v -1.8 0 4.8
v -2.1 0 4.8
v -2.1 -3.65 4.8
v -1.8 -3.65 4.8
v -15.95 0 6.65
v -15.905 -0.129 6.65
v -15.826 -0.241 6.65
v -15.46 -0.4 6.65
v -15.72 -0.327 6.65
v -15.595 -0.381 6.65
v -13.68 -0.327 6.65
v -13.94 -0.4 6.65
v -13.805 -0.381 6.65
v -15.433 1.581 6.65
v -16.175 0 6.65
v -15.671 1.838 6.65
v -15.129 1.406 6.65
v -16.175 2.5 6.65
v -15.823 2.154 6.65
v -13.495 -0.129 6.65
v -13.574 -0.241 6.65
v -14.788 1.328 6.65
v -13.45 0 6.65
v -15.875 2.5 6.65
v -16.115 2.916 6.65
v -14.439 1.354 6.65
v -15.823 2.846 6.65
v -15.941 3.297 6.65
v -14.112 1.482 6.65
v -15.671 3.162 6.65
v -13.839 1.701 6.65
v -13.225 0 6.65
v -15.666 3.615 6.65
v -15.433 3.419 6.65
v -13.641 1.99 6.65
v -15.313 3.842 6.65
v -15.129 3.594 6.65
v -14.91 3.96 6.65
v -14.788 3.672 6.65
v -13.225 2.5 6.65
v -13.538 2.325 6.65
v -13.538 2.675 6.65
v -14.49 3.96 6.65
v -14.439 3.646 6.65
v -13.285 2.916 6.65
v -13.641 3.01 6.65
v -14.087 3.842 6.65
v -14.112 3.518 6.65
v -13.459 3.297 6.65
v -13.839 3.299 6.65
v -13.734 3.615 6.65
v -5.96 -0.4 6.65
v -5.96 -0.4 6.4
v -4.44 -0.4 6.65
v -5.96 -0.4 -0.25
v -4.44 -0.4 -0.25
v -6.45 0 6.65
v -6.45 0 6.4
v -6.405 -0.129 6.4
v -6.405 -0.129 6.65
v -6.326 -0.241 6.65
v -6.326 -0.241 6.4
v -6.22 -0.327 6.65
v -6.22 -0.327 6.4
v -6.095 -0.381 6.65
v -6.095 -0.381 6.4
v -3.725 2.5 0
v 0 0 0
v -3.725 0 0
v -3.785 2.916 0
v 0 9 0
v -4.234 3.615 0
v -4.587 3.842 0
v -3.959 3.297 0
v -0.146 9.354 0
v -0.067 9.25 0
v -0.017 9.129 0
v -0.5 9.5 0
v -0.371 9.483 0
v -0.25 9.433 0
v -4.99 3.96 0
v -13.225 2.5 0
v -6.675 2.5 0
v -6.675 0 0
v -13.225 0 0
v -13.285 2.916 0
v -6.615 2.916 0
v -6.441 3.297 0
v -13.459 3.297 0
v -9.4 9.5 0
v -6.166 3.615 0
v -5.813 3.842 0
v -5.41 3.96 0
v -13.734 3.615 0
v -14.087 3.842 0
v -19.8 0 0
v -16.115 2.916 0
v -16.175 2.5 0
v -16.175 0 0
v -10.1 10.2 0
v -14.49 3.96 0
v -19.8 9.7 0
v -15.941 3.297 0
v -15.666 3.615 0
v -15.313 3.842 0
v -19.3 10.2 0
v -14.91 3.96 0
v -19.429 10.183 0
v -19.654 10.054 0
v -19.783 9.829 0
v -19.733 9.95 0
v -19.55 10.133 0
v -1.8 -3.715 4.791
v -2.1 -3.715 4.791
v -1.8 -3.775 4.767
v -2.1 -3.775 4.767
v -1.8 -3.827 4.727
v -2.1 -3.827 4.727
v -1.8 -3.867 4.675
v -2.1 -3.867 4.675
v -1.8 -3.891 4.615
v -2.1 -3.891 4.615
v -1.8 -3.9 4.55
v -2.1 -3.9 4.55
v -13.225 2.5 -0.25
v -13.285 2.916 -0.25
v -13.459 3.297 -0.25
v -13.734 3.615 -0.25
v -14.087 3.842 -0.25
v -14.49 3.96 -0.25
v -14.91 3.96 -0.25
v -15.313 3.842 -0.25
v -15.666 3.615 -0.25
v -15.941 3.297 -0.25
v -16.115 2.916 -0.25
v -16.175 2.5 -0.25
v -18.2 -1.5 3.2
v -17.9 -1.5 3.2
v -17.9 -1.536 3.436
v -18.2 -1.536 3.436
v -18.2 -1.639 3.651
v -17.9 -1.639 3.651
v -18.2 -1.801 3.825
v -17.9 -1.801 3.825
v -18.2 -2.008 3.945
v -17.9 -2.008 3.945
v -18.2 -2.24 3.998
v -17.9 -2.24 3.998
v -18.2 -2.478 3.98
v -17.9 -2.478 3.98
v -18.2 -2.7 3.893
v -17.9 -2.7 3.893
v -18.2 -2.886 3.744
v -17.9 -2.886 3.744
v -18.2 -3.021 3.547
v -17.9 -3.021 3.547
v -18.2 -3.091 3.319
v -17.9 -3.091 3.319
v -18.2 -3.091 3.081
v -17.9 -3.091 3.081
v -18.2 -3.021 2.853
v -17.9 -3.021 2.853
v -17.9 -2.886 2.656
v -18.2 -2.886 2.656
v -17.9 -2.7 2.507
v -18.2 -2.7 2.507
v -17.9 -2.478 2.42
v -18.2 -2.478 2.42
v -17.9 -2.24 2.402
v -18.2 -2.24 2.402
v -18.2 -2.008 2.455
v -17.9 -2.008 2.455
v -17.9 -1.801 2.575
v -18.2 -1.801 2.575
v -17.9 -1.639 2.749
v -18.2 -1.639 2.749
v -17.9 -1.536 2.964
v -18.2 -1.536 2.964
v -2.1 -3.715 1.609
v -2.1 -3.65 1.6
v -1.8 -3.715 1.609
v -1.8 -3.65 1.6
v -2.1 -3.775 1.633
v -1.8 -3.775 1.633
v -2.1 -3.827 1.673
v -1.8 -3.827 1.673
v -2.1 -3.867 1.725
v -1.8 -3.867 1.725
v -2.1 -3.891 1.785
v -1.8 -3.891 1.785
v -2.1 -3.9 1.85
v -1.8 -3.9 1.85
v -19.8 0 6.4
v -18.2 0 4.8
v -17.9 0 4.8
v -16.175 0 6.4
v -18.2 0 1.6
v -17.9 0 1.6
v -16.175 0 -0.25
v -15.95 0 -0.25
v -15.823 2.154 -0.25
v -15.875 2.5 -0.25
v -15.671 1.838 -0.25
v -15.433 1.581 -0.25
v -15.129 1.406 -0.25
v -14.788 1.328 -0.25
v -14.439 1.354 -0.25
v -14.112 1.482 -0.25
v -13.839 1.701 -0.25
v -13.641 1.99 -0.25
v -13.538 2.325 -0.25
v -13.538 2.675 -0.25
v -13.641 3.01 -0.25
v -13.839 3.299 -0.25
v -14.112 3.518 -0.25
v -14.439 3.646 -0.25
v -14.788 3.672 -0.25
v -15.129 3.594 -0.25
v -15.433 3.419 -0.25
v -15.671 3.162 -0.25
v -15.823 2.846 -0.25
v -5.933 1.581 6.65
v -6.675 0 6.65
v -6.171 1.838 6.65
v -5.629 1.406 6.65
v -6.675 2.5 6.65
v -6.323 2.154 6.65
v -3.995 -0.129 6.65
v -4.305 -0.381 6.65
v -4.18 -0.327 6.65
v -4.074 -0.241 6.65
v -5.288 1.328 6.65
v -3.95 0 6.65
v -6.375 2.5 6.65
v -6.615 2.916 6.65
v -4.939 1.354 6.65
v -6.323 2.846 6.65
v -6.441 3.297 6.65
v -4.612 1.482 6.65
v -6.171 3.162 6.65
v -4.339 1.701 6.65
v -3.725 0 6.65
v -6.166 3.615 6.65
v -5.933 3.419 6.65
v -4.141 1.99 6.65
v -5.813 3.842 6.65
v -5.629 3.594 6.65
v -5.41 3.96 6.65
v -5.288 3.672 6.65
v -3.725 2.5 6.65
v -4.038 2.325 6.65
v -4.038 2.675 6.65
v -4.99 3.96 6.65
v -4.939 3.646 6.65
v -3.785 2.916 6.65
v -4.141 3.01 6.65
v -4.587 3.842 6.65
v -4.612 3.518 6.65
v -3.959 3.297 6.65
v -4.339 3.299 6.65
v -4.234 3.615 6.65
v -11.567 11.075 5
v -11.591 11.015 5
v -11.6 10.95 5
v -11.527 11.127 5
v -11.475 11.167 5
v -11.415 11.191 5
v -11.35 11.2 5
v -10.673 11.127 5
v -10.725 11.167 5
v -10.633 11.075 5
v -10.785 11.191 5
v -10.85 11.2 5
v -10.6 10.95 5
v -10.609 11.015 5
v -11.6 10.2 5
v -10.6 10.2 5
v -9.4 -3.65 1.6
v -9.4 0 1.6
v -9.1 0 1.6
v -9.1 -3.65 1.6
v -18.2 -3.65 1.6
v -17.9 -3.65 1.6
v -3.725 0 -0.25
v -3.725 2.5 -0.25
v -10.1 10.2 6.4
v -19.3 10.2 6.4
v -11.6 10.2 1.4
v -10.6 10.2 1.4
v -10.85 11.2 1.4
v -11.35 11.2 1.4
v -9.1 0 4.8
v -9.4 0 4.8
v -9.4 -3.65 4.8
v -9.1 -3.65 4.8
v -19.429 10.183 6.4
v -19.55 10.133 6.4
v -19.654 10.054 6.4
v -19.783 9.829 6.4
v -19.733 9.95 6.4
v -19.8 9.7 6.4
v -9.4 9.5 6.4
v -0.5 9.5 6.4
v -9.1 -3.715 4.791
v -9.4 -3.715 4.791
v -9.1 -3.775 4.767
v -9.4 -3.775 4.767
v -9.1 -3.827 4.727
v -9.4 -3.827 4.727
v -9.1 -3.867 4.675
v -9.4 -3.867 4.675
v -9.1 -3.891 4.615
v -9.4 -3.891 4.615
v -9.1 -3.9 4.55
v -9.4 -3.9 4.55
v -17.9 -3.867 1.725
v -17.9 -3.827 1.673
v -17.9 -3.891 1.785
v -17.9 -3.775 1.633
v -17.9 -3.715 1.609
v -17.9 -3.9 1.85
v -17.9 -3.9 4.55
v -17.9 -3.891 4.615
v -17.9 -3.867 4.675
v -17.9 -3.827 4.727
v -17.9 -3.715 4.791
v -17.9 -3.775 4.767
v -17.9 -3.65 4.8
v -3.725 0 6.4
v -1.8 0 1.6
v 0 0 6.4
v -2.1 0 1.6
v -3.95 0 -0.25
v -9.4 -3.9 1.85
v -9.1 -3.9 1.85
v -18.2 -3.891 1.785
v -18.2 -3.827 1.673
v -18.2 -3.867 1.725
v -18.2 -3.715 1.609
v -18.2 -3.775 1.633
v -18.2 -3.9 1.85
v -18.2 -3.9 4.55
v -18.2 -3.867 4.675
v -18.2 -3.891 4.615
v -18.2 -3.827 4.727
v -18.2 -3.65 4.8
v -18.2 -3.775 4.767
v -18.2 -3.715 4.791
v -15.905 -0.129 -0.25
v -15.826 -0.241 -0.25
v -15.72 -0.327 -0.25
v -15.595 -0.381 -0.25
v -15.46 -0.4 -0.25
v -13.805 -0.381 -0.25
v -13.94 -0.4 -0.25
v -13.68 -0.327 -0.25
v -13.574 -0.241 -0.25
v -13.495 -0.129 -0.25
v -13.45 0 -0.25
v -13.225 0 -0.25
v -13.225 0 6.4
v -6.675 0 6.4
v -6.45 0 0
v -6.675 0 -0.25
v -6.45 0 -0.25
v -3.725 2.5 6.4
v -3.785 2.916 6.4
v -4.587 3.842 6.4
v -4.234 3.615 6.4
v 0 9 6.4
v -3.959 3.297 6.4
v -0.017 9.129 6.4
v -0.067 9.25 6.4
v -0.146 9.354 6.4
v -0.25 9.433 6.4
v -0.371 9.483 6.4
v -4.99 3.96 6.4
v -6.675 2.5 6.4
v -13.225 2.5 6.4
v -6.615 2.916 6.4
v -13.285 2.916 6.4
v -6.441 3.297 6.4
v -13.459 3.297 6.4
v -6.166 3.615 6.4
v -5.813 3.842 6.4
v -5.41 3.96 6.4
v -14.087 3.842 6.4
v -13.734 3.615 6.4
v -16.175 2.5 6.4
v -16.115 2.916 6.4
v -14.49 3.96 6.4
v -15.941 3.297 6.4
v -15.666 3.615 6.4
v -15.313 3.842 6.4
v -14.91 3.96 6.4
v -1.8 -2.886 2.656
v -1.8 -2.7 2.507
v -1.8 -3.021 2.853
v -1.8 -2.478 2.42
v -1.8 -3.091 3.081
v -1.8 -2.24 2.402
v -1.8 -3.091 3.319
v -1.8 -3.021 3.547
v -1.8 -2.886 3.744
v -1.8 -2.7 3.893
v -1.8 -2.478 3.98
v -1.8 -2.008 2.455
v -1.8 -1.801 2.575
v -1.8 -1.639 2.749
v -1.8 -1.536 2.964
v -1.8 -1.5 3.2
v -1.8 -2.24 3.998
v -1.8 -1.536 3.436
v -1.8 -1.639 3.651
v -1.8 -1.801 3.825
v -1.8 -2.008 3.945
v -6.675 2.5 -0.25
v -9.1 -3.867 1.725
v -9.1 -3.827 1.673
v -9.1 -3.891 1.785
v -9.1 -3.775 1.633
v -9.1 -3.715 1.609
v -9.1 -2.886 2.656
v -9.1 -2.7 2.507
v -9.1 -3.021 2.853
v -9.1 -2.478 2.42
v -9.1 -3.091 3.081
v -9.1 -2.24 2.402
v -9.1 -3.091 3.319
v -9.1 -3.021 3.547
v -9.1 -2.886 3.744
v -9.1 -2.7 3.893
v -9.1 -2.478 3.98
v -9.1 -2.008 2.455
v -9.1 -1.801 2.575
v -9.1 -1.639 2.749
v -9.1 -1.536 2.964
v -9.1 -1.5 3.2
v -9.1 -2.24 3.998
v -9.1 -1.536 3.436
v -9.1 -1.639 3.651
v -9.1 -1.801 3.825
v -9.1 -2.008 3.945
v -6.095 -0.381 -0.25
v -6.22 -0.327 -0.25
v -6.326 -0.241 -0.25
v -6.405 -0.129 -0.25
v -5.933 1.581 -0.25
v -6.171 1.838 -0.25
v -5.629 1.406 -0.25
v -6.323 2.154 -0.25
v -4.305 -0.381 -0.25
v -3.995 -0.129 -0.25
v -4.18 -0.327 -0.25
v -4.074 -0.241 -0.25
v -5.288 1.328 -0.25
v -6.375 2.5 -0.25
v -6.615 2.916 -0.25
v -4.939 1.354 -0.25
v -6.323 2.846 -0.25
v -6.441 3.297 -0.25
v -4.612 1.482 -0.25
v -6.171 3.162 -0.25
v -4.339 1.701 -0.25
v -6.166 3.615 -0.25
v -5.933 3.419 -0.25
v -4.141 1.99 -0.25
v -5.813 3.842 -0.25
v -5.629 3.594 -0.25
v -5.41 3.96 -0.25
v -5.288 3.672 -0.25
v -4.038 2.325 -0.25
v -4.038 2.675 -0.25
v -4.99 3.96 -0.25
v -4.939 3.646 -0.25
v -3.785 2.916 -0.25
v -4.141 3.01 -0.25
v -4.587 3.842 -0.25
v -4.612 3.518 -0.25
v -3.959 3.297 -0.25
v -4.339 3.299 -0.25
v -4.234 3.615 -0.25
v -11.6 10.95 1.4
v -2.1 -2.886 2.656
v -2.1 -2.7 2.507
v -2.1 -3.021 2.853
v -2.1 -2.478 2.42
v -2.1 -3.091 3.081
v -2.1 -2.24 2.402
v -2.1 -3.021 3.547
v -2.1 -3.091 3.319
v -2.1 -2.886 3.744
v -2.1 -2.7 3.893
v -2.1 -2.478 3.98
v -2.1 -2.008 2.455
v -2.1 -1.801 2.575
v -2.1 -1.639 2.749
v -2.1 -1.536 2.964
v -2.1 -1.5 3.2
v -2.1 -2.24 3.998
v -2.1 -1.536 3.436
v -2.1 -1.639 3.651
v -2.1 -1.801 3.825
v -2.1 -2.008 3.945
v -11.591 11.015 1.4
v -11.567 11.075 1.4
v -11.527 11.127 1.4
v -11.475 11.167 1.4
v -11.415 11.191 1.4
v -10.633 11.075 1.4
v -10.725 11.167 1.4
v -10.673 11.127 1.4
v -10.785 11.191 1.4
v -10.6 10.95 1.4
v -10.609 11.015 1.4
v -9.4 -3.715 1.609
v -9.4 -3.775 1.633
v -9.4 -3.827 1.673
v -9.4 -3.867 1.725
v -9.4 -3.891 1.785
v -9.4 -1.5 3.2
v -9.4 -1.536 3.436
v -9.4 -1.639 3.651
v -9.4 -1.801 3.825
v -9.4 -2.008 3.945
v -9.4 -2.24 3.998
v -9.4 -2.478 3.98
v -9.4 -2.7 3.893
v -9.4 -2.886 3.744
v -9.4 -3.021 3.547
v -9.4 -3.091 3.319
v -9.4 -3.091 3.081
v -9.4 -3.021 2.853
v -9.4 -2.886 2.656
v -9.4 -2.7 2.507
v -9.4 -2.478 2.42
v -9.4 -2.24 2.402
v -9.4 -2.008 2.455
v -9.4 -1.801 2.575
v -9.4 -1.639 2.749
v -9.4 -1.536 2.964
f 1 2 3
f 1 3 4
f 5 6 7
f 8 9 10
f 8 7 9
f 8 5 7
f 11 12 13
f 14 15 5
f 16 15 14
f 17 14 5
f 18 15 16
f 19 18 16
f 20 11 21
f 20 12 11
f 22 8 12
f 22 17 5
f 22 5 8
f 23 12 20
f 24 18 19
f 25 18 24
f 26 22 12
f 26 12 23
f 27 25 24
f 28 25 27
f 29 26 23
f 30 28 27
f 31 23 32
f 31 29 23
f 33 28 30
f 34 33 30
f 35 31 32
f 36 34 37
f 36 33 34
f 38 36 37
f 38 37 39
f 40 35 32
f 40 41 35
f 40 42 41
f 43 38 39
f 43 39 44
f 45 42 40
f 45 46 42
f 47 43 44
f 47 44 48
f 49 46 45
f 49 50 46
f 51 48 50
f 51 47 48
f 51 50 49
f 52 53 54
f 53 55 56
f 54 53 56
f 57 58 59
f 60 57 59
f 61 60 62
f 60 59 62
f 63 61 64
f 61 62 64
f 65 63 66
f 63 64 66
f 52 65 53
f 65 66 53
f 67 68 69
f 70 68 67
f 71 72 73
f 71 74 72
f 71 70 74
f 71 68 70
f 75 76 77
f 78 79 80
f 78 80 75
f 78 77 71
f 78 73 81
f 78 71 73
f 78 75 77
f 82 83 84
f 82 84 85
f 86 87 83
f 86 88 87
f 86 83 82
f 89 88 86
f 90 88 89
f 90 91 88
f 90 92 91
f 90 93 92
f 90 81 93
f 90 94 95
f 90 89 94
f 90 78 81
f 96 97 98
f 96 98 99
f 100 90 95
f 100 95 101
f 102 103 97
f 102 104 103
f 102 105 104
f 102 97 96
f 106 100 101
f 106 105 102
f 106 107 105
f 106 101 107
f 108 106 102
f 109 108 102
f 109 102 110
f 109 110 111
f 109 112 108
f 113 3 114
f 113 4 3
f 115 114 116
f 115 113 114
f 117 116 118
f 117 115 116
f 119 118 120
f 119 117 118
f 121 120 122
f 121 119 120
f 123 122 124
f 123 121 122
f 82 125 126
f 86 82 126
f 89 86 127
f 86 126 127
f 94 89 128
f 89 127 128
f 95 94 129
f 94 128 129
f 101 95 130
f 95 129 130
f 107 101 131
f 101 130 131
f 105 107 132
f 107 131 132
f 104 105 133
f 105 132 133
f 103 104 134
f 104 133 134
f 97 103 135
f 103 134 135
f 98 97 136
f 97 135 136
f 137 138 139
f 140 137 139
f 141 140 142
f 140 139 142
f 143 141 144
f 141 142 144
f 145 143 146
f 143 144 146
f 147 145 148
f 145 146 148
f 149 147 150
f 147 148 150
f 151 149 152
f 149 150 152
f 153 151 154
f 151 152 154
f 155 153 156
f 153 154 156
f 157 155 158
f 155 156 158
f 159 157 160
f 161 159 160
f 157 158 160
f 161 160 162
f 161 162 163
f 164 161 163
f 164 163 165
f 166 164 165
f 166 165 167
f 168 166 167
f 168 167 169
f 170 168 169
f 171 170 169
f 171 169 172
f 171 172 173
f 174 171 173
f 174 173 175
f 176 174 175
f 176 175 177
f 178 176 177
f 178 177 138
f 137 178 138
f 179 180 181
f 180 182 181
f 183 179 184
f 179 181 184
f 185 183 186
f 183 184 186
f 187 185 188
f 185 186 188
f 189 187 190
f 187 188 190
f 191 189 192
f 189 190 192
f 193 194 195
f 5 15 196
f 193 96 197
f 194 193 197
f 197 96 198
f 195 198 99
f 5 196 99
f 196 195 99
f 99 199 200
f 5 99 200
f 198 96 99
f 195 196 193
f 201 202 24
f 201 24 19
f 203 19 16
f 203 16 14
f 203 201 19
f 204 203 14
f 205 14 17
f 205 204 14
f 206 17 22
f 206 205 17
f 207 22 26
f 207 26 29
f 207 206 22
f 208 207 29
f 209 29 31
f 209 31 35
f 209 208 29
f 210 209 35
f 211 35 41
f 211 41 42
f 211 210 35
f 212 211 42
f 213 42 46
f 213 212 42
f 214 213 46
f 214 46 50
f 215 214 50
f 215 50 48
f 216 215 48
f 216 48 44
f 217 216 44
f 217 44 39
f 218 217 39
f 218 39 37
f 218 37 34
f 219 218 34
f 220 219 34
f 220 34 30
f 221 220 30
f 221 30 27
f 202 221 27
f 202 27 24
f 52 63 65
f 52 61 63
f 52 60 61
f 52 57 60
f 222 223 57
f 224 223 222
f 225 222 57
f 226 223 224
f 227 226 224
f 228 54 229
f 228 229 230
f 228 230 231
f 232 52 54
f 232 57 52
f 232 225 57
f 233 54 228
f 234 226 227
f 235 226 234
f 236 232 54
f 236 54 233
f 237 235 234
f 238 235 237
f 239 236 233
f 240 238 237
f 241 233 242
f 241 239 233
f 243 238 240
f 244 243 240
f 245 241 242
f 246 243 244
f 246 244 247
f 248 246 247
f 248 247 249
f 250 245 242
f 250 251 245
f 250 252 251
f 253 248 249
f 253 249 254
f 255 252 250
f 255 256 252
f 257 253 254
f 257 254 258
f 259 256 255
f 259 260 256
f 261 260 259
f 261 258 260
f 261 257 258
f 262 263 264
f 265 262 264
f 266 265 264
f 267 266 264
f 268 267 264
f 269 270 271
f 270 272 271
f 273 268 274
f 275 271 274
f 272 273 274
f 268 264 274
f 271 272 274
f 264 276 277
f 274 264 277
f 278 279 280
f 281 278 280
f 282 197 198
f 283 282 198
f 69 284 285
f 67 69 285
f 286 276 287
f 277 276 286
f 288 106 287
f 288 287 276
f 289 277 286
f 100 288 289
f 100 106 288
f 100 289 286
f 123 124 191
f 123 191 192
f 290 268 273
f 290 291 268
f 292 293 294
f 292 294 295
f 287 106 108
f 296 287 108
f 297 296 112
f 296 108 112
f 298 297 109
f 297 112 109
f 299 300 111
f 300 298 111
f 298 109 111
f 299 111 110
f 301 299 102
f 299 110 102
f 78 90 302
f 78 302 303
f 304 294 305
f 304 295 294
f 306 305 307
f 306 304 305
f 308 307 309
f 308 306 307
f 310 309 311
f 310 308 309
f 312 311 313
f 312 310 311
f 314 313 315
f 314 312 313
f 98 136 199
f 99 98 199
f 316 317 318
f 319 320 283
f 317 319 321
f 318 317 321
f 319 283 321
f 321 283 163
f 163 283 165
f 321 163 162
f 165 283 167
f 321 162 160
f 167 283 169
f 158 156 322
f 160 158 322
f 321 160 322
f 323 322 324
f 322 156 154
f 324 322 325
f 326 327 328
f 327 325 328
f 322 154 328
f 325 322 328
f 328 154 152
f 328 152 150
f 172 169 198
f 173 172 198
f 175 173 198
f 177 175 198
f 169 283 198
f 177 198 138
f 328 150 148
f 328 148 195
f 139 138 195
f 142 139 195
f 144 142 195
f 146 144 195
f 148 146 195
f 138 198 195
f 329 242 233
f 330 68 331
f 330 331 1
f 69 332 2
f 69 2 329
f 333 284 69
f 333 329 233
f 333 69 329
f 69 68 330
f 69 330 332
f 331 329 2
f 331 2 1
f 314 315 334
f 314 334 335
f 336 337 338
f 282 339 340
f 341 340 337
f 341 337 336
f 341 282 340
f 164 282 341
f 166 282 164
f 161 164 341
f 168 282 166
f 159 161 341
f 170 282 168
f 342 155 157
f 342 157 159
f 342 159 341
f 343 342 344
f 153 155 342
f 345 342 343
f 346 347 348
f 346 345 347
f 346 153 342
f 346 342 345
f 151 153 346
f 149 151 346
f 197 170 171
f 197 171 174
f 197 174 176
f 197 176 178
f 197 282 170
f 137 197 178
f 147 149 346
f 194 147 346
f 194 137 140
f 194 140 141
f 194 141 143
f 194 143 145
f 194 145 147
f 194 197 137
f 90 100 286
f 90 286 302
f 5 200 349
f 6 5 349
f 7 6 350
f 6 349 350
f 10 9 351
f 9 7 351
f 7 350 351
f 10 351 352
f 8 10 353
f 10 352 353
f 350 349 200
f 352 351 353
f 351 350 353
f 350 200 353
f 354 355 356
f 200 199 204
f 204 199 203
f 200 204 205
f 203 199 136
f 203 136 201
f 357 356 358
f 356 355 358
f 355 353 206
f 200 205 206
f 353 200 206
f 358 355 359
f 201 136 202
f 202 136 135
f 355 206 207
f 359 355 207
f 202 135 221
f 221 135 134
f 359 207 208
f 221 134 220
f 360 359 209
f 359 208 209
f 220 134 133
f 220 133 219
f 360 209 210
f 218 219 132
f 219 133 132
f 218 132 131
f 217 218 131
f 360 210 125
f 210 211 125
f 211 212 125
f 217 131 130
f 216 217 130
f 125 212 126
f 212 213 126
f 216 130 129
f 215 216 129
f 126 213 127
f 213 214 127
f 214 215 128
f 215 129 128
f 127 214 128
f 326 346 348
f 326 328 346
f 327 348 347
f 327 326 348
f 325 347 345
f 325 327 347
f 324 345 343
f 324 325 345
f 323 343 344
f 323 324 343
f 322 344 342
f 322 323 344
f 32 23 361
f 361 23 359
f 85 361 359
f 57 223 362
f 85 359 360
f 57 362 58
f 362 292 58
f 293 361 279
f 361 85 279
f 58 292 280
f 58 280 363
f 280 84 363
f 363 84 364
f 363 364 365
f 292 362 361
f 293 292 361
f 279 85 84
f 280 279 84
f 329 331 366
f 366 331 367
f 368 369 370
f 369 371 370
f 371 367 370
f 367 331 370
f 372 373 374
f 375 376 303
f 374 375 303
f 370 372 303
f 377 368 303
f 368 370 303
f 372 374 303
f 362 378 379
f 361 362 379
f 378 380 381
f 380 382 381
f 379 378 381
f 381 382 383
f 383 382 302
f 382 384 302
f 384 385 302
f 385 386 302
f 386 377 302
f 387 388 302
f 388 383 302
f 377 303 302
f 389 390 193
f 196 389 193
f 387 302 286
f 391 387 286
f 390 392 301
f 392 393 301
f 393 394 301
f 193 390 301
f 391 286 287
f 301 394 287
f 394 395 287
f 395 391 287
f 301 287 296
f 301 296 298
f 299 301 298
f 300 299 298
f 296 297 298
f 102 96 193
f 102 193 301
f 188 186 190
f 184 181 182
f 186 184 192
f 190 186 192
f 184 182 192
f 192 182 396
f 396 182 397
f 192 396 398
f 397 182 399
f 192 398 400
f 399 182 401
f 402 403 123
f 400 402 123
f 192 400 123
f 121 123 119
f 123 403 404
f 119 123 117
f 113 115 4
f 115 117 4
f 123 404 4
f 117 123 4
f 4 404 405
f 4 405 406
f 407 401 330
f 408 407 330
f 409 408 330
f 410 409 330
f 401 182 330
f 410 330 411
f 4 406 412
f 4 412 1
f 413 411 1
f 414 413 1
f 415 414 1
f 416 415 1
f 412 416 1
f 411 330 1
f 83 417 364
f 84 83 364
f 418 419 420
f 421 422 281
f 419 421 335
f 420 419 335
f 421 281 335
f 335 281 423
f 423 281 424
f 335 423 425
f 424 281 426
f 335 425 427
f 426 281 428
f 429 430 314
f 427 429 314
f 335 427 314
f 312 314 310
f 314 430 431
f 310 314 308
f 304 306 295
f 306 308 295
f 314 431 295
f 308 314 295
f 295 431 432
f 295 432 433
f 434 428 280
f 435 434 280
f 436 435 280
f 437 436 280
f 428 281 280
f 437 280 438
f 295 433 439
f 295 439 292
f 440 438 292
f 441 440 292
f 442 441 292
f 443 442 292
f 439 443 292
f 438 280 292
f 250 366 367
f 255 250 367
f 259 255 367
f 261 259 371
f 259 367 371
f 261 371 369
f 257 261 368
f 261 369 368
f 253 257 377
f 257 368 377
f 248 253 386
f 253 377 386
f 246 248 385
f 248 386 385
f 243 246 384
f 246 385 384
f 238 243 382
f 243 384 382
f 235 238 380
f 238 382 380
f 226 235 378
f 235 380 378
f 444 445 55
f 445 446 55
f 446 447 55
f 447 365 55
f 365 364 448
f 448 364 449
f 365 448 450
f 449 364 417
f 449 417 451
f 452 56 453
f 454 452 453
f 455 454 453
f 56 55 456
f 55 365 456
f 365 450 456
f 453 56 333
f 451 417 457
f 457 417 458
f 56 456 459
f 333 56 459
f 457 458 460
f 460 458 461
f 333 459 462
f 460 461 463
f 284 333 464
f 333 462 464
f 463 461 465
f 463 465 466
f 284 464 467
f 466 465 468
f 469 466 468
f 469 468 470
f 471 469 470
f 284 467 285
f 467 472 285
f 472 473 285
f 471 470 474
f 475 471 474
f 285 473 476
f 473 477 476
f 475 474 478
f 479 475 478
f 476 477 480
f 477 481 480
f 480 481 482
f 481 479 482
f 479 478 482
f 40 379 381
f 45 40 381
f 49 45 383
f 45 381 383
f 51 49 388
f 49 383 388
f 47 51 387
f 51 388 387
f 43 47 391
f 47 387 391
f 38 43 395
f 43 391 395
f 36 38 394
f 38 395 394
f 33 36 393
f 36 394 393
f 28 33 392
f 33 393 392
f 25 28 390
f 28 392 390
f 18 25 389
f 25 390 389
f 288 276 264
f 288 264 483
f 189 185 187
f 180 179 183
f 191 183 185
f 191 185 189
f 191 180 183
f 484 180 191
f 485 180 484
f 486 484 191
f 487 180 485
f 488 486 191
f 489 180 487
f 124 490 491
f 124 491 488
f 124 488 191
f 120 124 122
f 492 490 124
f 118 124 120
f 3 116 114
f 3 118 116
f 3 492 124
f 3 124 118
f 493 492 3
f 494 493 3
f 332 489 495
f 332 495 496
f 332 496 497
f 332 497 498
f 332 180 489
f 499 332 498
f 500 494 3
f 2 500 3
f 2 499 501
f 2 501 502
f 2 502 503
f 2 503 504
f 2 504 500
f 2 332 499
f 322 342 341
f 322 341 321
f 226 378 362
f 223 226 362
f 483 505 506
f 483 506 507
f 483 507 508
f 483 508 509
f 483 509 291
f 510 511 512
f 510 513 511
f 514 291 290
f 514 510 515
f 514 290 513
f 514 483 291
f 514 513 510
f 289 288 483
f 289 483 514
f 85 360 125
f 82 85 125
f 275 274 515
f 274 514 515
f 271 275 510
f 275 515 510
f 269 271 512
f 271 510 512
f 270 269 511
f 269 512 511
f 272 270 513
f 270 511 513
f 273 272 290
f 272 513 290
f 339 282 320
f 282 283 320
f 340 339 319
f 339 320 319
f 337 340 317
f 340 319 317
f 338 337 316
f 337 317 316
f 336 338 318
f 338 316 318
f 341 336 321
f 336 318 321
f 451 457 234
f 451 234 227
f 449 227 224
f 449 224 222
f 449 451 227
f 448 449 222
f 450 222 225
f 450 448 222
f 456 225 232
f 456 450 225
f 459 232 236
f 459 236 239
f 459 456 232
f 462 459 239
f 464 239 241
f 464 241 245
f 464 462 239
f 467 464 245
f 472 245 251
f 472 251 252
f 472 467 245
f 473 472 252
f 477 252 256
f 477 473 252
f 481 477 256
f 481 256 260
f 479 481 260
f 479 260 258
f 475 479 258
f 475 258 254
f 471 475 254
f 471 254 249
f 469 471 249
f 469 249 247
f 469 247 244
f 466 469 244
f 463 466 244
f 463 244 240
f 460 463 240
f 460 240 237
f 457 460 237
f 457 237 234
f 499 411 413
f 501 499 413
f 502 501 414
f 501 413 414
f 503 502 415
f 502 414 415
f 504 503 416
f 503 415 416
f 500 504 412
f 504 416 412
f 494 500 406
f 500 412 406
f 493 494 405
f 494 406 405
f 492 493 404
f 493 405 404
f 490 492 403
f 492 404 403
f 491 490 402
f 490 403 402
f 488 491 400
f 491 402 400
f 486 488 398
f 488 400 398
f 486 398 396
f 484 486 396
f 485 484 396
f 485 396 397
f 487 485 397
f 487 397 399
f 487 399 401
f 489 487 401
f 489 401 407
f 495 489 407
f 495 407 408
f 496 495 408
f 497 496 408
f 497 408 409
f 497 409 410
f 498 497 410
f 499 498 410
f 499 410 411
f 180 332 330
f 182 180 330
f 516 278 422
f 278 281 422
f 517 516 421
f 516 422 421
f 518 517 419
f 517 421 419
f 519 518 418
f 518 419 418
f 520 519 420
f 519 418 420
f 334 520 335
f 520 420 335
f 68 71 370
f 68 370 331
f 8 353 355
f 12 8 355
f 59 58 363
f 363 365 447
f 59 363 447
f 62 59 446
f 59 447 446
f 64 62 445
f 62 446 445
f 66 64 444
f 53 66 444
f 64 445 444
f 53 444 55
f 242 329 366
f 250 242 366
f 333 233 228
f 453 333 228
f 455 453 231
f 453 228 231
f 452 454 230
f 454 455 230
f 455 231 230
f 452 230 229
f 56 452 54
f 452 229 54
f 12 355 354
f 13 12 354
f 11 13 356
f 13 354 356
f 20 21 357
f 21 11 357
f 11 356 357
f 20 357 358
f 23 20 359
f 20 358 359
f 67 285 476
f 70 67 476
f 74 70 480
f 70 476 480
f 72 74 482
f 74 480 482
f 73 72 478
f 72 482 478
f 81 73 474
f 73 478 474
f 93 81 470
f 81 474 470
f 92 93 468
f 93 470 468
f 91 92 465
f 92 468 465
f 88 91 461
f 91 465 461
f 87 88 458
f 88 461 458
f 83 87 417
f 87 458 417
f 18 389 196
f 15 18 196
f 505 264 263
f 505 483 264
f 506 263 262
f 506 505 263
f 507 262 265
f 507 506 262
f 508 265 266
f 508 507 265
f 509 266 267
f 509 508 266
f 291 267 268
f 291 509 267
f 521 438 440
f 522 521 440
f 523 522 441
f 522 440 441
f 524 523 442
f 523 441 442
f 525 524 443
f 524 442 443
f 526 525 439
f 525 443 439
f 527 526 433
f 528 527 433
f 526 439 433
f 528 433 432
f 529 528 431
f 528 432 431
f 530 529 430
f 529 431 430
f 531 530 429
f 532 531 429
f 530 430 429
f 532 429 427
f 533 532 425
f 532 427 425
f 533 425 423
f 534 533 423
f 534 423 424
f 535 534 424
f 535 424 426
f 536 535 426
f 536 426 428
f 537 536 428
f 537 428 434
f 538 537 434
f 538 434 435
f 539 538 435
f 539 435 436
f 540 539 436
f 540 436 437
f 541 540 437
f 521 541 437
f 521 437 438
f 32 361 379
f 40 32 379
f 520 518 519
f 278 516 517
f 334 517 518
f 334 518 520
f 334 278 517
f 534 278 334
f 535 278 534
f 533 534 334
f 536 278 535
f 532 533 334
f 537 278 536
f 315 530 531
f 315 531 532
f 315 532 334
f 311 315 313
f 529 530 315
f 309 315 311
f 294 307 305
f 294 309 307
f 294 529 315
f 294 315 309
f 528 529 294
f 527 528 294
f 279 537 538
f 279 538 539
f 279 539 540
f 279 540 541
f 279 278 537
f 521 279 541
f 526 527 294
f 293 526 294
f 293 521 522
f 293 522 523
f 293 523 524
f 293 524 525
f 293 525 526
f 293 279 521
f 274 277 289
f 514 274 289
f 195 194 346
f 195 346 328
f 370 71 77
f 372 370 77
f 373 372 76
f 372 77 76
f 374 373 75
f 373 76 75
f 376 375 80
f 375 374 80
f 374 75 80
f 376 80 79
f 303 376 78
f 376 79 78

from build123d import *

# Parameters (mm, degrees)
SKETCH1_R                = 1.175
BOSS_EXTRUDE1_DEPTH      = 6.4
SKETCH2_W                = 1
SKETCH2_H                = 3.6
BOSS_EXTRUDE2_DEPTH      = 1
SKETCH3_W                = 0.3
SKETCH3_H                = 3.2
BOSS_EXTRUDE3_DEPTH      = 3.9
SKETCH4_R                = 0.8
CUT_EXTRUDE1_DEPTH       = 23.144976857
BOSS_EXTRUDE4_DEPTH      = 0.25
BOSS_EXTRUDE4_DEPTH_BACK = 6.65
SKETCH5_R                = 1.175
FILLET1_R                = 0.5
FILLET2_R                = 0.25
FILLET3_R                = 0.25


with BuildPart() as part:
    # Sketch1 → Boss-Extrude1 (new body)
    with BuildSketch(Plane.XY):
        Polygon((0, 0), (-3.95, 0), (-3.95, -0.4), (-6.45, -0.4), (-6.45, 0), (-13.45, 0), (-13.45, -0.4), (-15.95, -0.4), (-15.95, 0), (-19.8, 0), (-19.8, 10.2), (-10.1, 10.2), (-9.4, 9.5), (0, 9.5), align=None)
        with Locations((-14.7, 2.5)):
            Circle(SKETCH1_R, mode=Mode.SUBTRACT)
        with Locations((-5.2, 2.5)):
            Circle(SKETCH1_R, mode=Mode.SUBTRACT)
    extrude(amount=BOSS_EXTRUDE1_DEPTH)

    # Sketch2 → Boss-Extrude2 (add)
    with BuildSketch(Plane(origin=(0, 10.2, 0), x_dir=(1, 0, 0), z_dir=(0, 1, 0))):
        with Locations((-11.1, -3.2)):
            Rectangle(SKETCH2_W, SKETCH2_H)
    extrude(amount=BOSS_EXTRUDE2_DEPTH)

    # Sketch3 → Boss-Extrude3 (add)
    with BuildSketch(Plane.XZ):
        with Locations((-18.05, 3.2)):
            Rectangle(SKETCH3_W, SKETCH3_H)
        with Locations((-9.25, 3.2)):
            Rectangle(SKETCH3_W, SKETCH3_H)
        with Locations((-1.95, 3.2)):
            Rectangle(SKETCH3_W, SKETCH3_H)
    extrude(amount=BOSS_EXTRUDE3_DEPTH)

    # Sketch4 → Cut-Extrude1 (cut, through all)
    with BuildSketch(Plane(origin=(-1.8, 0, 0), x_dir=(0, 0, -1), z_dir=(1, 0, 0))):
        with Locations(Location((-3.2, -2.3, 0), (0, 0, 90))):
            Circle(SKETCH4_R)
    extrude(amount=-CUT_EXTRUDE1_DEPTH, mode=Mode.SUBTRACT)

    # Sketch5 → Boss-Extrude4 (add, two sides: drawn at the far end of the back side and taken through both)
    # profile 1 of 2: a face of its own
    with BuildSketch(Plane.XY.offset(6.4).offset(-BOSS_EXTRUDE4_DEPTH_BACK)):
        with BuildLine():
            Line((-16.175, 2.5), (-16.175, 0))
            Line((-16.175, 0), (-15.95, 0))
            Line((-15.95, 0), (-15.95, -0.4))
            Line((-15.95, -0.4), (-13.45, -0.4))
            Line((-13.45, -0.4), (-13.45, 0))
            Line((-13.45, 0), (-13.225, 0))
            Line((-13.225, 0), (-13.225, 2.5))
            ThreePointArc((-13.225, 2.5), (-14.7, 3.975), (-16.175, 2.5))
        make_face()
        with Locations(Location((-14.7, 2.5, 0), (0, 0, 180))):
            Circle(SKETCH5_R, mode=Mode.SUBTRACT)
    # profile 2 of 2: a face of its own
    with BuildSketch(Plane.XY.offset(6.4).offset(-BOSS_EXTRUDE4_DEPTH_BACK)):
        with BuildLine():
            Line((-6.675, 2.5), (-6.675, 0))
            Line((-6.675, 0), (-6.45, 0))
            Line((-6.45, 0), (-6.45, -0.4))
            Line((-6.45, -0.4), (-3.95, -0.4))
            Line((-3.95, -0.4), (-3.95, 0))
            Line((-3.95, 0), (-3.725, 0))
            Line((-3.725, 0), (-3.725, 2.5))
            ThreePointArc((-3.725, 2.5), (-5.2, 3.975), (-6.675, 2.5))
        make_face()
        with Locations(Location((-5.2, 2.5, 0), (0, 0, 180))):
            Circle(SKETCH5_R, mode=Mode.SUBTRACT)
    extrude(amount=BOSS_EXTRUDE4_DEPTH + BOSS_EXTRUDE4_DEPTH_BACK)

    # Fillet1
    # the kernel refuses this fillet: 0.5 mm, written as the material it takes off along each edge
    with BuildSketch(Plane(origin=(-19.8, 10.2, -1.25), x_dir=(0, -1, 0), z_dir=(0, 0, 1)), Plane(origin=(0, 9.5, -1.25), x_dir=(-1, 0, 0), z_dir=(0, 0, 1))) as fillet1_piece_1:
        with BuildLine():
            CenterArc((FILLET1_R, FILLET1_R), FILLET1_R, 180, 90)
            Line((0, FILLET1_R), (-FILLET1_R * 0.02, FILLET1_R))
            Line((-FILLET1_R * 0.02, FILLET1_R), (-FILLET1_R * 0.02, -FILLET1_R * 0.02))
            Line((-FILLET1_R * 0.02, -FILLET1_R * 0.02), (FILLET1_R, -FILLET1_R * 0.02))
            Line((FILLET1_R, -FILLET1_R * 0.02), (FILLET1_R, 0))
        make_face()
    extrude(amount=8.9, mode=Mode.SUBTRACT)
    with BuildSketch(Plane(origin=(-3.95, -0.4, 7.874744871), x_dir=(-1, 0, 0), z_dir=(0, 0, -1))) as fillet1_piece_2:
        with BuildLine():
            CenterArc((0.489897949, 0.5), FILLET1_R, 191.536959033, 78.463040967)
            Line((0, 0.4), (-0.009797959, 0.398))
            ThreePointArc((-0.009797959, 0.398), (-0.01, 0.2), (-0.01, 0))
            Line((-0.01, 0), (0, -0.01))
            Line((0, -0.01), (0.489897949, -0.01))
            Line((0.489897949, -0.01), (0.489897949, 0))
        make_face()
    extrude(amount=9.349489743, mode=Mode.SUBTRACT)
    with BuildSketch(Plane(origin=(-6.45, -0.4, 0), x_dir=(1, 0, 0), z_dir=(0, 0, 1))) as fillet1_piece_3:
        with BuildLine():
            CenterArc((0.489897949, 0.5), FILLET1_R, 191.536959033, 78.463040967)
            Line((0, 0.4), (-0.009797959, 0.398))
            ThreePointArc((-0.009797959, 0.398), (-0.01, 0.2), (-0.01, 0))
            Line((-0.01, 0), (0, -0.01))
            Line((0, -0.01), (0.489897949, -0.01))
            Line((0.489897949, -0.01), (0.489897949, 0))
        make_face()
    extrude(amount=6.4, mode=Mode.SUBTRACT)
    with BuildSketch(Plane(origin=(-13.45, -0.4, -1.474744871), x_dir=(-1, 0, 0), z_dir=(0, 0, 1))) as fillet1_piece_4:
        with BuildLine():
            CenterArc((0.489897949, -0.5), FILLET1_R, 90, 78.463040967)
            Line((0, -0.4), (-0.009797959, -0.398))
            ThreePointArc((-0.009797959, -0.398), (-0.01, -0.2), (-0.01, 0))
            Line((-0.01, 0), (0, 0.01))
            Line((0, 0.01), (0.489897949, 0.01))
            Line((0.489897949, 0.01), (0.489897949, 0))
        make_face()
    extrude(amount=9.349489743, mode=Mode.SUBTRACT)
    with BuildSketch(Plane(origin=(-15.95, -0.4, -1.474744871), x_dir=(0, 1, 0), z_dir=(0, 0, 1))) as fillet1_piece_5:
        with BuildLine():
            CenterArc((0.5, -0.489897949), FILLET1_R, 101.536959033, 78.463040967)
            Line((0, -0.489897949), (-0.01, -0.489897949))
            Line((-0.01, -0.489897949), (-0.01, 0))
            Line((-0.01, 0), (0, 0.01))
            ThreePointArc((0, 0.01), (0.2, 0.01), (0.398, 0.009797959))
            Line((0.398, 0.009797959), (0.4, 0))
        make_face()
    extrude(amount=9.349489743, mode=Mode.SUBTRACT)
    with BuildSketch(Plane(origin=(-6.45, -0.4, -1.474744871), x_dir=(1, 0, 0), z_dir=(0, 0, 1))) as fillet1_piece_6:
        with BuildLine():
            CenterArc((0.489897949, 0.5), FILLET1_R, 191.536959033, 78.463040967)
            Line((0, 0.4), (-0.009797959, 0.398))
            ThreePointArc((-0.009797959, 0.398), (-0.01, 0.2), (-0.01, 0))
            Line((-0.01, 0), (0, -0.01))
            Line((0, -0.01), (0.489897949, -0.01))
            Line((0.489897949, -0.01), (0.489897949, 0))
        make_face()
    extrude(amount=1.474744871, mode=Mode.SUBTRACT)
    with BuildSketch(Plane(origin=(-6.45, -0.4, 6.4), x_dir=(1.578737141016463e-12, 1.0, 0), z_dir=(0, 0, 1))) as fillet1_piece_7:
        with BuildLine():
            CenterArc((0.5, -0.489897949), FILLET1_R, 101.536959033, 78.463040967)
            Line((0, -0.489897949), (-0.01, -0.489897949))
            Line((-0.01, -0.489897949), (-0.01, 0))
            Line((-0.01, 0), (0, 0.01))
            ThreePointArc((0, 0.01), (0.2, 0.01), (0.398, 0.009797959))
            Line((0.398, 0.009797959), (0.4, 0))
        make_face()
    extrude(amount=1.474744871, mode=Mode.SUBTRACT)

    # Fillet2
    fillet2_edges = [part.edges().sort_by_distance(p)[0] for p in [
        (-18.05, -3.9, 1.6),
        (-18.05, -3.9, 4.8),
        (-9.25, -3.9, 1.6),
        (-9.25, -3.9, 4.8),
        (-1.95, -3.9, 1.6),
        (-1.95, -3.9, 4.8),
    ]]
    fillet(fillet2_edges, radius=FILLET2_R)

    # Fillet3
    fillet3_edges = [part.edges().sort_by_distance(p)[0] for p in [
        (-11.6, 11.2, 3.2),
        (-10.6, 11.2, 3.2),
    ]]
    fillet(fillet3_edges, radius=FILLET3_R)


solid = part.part
